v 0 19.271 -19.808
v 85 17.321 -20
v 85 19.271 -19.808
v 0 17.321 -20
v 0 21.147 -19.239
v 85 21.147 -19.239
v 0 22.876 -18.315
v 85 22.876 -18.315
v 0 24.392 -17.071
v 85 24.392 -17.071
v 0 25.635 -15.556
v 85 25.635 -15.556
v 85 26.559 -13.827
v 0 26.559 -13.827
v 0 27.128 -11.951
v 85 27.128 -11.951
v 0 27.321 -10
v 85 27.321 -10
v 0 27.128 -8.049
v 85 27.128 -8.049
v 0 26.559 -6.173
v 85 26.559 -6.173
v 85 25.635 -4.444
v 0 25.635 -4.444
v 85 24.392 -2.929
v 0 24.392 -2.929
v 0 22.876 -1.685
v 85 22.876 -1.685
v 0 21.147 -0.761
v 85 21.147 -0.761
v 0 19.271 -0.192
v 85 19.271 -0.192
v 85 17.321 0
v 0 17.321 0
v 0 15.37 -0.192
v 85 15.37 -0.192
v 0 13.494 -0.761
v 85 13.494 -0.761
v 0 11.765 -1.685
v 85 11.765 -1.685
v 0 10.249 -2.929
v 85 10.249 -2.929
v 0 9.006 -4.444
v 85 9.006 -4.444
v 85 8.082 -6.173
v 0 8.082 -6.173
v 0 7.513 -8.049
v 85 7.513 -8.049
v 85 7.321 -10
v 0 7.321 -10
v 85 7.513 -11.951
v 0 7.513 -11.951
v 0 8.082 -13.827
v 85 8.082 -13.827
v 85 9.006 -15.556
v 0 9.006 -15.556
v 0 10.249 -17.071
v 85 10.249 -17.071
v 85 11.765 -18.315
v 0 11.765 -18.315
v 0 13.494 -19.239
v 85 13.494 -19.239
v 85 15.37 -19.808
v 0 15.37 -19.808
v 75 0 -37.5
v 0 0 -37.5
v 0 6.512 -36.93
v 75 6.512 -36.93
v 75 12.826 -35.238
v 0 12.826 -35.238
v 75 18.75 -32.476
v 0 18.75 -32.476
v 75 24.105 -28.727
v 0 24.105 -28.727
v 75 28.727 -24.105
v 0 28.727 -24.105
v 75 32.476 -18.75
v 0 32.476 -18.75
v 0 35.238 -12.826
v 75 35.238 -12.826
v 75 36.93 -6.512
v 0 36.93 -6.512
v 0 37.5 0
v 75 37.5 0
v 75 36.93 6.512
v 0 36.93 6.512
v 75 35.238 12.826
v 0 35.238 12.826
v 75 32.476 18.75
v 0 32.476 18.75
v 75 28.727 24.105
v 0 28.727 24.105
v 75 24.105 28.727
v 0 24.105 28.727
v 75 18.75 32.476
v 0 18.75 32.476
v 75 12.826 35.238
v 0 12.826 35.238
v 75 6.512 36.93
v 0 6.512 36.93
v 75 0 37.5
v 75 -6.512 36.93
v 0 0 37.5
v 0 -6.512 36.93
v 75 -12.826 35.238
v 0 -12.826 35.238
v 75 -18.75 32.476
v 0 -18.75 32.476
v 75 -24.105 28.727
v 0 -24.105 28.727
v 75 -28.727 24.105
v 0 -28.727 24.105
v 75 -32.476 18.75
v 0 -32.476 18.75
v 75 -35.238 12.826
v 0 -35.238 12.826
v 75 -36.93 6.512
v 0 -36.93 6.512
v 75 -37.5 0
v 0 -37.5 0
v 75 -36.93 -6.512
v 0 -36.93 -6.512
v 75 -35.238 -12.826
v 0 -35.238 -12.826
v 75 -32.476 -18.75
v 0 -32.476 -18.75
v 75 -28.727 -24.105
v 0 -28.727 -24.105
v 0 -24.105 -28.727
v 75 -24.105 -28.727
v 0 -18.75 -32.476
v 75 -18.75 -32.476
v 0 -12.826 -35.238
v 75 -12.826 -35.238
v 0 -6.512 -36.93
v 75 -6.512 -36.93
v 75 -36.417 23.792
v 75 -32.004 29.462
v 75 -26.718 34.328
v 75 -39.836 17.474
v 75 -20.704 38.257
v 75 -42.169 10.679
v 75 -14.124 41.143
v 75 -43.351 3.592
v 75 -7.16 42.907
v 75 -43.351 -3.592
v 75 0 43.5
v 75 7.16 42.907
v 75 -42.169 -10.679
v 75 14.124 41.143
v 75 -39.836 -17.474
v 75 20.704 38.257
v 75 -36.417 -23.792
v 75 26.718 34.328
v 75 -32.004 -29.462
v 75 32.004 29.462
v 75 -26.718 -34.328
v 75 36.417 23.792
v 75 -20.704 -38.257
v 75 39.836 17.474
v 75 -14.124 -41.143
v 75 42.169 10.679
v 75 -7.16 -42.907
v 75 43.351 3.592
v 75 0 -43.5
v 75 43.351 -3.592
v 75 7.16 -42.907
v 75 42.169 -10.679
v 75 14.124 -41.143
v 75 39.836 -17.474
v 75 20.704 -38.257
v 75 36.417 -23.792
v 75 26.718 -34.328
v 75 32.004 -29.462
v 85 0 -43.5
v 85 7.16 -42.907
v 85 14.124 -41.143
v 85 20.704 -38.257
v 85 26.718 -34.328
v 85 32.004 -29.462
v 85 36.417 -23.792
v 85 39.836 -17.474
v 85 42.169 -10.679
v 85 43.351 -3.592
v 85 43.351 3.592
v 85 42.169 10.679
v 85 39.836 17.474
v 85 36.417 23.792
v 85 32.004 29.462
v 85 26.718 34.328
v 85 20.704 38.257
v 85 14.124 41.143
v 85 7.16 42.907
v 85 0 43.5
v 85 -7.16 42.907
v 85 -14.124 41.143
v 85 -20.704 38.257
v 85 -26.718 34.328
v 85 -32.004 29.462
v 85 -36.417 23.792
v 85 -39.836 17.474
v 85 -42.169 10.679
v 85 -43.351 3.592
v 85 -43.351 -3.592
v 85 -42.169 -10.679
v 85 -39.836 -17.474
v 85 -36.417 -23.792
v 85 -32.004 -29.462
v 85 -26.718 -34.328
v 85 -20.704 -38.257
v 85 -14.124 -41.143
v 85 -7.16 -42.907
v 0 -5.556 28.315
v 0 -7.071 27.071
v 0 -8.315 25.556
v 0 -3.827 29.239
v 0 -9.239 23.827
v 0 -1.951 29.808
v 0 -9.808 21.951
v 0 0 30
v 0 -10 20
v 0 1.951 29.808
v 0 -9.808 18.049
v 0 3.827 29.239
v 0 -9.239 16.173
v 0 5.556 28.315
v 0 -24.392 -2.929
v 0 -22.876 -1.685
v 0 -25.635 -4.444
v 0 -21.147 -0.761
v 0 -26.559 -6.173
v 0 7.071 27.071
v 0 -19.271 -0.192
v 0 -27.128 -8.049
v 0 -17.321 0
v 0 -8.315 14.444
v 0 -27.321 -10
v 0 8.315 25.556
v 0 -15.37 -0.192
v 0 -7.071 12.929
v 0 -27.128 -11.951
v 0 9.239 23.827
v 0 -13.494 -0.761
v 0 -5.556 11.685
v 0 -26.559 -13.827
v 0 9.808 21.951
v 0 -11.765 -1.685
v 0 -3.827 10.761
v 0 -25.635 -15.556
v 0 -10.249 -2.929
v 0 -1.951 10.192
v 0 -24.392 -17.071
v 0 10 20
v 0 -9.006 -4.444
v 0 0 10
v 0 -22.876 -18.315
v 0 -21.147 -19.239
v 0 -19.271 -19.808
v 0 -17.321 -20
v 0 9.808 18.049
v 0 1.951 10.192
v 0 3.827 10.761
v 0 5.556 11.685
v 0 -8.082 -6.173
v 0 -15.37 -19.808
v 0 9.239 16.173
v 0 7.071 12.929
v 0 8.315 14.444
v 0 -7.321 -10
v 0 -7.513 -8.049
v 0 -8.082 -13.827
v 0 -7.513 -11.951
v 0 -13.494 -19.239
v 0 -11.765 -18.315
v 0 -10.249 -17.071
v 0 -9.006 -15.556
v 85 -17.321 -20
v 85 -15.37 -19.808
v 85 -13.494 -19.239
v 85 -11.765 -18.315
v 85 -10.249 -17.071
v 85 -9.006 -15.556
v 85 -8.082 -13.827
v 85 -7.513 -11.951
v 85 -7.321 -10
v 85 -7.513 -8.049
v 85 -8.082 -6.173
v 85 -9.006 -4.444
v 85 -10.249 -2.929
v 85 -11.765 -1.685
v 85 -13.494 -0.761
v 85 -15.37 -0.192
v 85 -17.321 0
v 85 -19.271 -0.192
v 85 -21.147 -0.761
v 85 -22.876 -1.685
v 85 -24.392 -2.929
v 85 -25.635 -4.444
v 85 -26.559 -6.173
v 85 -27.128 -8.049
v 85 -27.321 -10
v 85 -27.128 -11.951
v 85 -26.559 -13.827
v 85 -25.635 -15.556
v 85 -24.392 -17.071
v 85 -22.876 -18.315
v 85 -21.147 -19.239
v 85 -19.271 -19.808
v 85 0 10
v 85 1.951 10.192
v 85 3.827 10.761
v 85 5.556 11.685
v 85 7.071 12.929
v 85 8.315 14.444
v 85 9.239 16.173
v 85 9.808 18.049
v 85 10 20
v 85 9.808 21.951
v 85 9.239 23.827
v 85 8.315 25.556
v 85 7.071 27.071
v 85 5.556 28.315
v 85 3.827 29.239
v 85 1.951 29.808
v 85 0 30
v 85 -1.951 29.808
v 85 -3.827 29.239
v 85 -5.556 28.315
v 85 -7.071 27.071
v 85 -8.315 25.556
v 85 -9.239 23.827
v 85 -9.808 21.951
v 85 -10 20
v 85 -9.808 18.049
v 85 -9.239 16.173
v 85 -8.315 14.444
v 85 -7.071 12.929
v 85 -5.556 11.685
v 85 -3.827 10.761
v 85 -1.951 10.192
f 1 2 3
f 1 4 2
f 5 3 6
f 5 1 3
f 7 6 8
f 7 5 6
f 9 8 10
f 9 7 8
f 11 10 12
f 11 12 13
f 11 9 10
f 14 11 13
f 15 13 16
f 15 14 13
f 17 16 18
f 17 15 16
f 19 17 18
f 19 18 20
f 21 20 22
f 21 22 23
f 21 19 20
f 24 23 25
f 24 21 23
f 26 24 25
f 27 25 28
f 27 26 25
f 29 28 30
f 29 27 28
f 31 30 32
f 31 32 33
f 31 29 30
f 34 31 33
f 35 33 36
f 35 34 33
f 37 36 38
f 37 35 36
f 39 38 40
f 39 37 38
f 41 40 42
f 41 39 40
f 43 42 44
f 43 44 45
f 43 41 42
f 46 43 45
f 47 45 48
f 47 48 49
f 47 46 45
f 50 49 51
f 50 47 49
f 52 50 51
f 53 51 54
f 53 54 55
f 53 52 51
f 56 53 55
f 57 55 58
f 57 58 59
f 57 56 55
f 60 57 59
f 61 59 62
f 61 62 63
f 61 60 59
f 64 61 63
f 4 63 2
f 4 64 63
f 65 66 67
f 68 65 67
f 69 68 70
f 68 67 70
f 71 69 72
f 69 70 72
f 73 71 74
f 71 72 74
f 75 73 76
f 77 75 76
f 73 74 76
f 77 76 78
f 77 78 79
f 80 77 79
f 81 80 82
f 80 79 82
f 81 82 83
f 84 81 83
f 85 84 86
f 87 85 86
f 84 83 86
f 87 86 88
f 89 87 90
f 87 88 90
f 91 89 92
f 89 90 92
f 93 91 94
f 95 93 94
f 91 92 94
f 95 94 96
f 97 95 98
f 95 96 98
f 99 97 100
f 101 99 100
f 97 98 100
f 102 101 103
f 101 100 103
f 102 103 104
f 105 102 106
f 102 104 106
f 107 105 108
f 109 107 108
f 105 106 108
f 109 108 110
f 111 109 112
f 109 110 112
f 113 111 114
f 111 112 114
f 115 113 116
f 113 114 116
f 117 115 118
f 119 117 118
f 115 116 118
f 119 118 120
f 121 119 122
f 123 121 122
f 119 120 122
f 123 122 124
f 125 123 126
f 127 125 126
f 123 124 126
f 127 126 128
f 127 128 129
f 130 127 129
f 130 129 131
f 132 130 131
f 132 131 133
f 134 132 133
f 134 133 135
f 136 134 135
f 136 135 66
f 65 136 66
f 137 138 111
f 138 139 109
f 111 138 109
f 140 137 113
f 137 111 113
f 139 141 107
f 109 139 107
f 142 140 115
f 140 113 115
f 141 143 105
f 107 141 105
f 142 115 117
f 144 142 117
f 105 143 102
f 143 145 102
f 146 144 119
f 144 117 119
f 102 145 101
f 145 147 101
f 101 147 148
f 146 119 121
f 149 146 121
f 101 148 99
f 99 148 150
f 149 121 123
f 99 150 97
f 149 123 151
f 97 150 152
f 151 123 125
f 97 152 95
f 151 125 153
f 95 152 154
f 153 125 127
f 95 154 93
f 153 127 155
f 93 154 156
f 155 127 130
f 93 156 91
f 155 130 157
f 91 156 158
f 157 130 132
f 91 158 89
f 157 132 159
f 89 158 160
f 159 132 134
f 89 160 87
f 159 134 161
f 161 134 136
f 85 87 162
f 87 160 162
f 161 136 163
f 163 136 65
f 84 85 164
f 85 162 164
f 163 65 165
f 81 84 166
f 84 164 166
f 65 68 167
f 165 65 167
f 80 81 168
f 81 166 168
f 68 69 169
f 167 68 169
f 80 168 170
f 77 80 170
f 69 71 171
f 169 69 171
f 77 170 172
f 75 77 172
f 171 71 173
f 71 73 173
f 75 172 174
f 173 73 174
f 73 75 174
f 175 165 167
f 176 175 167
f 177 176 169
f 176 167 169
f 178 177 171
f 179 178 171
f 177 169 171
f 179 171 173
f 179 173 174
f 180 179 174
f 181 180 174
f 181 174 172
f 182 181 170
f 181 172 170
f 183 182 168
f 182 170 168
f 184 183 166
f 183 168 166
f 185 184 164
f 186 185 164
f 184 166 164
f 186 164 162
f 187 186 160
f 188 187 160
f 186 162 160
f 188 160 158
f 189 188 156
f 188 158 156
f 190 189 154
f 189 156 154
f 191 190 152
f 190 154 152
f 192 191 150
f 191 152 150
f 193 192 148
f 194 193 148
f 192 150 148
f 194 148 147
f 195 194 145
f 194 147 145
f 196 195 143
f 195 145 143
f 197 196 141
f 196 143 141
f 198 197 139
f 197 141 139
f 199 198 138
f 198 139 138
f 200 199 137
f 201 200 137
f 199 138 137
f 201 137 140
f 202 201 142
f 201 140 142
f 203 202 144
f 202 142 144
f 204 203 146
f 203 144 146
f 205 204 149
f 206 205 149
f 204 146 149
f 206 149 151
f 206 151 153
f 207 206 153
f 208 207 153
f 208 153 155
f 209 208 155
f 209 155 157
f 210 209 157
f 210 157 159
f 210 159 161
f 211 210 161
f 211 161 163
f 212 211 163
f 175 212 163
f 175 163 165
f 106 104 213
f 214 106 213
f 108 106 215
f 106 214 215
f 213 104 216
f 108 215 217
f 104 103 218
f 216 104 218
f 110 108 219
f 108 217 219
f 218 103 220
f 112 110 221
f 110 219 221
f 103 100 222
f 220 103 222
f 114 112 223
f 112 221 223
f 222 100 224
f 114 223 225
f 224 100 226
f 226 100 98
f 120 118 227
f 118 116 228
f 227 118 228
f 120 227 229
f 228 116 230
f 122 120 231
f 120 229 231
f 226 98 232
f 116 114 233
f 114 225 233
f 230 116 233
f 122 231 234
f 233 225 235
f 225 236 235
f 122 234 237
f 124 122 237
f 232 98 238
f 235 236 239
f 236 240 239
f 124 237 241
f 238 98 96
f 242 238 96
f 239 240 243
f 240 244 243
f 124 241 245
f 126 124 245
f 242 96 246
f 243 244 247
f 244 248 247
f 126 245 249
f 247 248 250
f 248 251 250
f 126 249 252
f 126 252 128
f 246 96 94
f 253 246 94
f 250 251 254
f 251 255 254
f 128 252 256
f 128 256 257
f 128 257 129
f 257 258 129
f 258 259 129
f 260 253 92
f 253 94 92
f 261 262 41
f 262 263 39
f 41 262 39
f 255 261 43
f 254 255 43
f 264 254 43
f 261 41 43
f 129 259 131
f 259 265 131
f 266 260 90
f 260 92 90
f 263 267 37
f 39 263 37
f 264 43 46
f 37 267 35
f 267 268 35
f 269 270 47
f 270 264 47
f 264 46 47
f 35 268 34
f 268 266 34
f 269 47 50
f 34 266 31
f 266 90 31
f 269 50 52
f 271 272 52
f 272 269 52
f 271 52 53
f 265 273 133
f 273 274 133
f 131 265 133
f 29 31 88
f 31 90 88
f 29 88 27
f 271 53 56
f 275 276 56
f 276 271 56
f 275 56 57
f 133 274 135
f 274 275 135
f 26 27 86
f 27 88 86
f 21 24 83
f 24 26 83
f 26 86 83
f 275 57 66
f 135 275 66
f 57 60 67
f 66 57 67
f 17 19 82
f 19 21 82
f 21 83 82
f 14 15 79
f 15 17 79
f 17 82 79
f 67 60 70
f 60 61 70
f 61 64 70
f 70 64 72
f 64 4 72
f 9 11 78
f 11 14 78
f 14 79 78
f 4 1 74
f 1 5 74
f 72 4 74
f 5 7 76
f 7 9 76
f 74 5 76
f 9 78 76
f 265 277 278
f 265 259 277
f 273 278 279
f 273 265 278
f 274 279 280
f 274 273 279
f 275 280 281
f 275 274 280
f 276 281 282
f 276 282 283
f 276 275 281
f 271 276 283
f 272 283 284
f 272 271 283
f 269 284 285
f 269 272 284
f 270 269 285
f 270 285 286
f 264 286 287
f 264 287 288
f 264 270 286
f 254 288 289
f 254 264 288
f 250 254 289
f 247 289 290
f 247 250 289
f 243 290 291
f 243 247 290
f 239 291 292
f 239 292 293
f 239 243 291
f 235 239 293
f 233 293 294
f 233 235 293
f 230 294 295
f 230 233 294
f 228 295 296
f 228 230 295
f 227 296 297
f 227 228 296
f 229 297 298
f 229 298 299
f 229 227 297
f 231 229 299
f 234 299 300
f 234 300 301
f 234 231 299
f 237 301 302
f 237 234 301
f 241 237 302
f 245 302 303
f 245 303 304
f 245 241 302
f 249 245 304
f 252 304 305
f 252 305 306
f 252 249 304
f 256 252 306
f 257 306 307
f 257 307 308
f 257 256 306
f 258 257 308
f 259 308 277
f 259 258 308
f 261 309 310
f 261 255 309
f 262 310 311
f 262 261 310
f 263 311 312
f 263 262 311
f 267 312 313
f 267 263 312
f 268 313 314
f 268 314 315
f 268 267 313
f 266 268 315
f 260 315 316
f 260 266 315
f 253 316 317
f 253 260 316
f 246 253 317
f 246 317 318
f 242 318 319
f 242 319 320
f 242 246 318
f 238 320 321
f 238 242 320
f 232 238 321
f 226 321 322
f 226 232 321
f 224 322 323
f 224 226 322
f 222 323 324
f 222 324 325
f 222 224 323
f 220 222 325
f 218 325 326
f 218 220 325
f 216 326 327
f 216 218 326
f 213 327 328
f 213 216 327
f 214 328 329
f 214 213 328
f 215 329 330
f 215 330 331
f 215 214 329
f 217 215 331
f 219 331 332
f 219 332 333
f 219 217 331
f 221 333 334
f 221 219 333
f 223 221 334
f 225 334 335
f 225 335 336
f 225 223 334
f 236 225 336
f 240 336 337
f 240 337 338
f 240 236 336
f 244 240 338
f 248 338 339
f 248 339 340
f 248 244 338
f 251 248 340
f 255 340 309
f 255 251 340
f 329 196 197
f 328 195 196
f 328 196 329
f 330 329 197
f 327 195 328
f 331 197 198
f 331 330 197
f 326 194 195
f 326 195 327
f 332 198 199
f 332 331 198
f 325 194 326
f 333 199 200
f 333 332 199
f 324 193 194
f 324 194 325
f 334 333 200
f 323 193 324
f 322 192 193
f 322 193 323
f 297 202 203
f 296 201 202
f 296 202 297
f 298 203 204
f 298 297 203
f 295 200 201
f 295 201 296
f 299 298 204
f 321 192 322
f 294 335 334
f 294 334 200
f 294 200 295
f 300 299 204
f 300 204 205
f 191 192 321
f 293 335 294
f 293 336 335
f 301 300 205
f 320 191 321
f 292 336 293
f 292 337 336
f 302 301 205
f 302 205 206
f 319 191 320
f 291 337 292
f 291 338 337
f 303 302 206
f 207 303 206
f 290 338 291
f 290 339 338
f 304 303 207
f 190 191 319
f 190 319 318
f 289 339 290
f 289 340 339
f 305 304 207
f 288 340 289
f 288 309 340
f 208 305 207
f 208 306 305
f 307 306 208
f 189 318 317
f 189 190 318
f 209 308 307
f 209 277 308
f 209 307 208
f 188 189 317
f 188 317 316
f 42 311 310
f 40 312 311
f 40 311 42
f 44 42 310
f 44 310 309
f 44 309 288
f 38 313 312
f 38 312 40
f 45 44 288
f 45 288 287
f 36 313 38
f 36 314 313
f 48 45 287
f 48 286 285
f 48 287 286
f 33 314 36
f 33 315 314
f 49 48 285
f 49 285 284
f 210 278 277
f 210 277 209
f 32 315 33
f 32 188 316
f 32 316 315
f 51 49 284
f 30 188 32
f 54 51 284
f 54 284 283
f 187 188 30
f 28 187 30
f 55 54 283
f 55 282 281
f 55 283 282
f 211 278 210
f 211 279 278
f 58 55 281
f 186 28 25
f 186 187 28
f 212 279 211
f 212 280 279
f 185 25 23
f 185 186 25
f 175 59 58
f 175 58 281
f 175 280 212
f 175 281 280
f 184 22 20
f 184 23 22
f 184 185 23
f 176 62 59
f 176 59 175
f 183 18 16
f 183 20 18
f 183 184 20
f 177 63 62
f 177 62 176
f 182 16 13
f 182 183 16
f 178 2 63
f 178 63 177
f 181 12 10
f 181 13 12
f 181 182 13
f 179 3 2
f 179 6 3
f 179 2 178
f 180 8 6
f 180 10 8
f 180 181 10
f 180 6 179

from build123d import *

# Parameters (mm, degrees)
BOSS_EXTRUDE1_OUTLINE_R   = 37.5
BOSS_EXTRUDE1_OUTLINE_R_2 = 10
BOSS_EXTRUDE1_DEPTH       = 75
SKETCH3_R                 = 43.5
SKETCH3_R_2               = 10
BOSS_EXTRUDE2_DEPTH       = 10


# Read off the part's stored shape, not the designer's step: Boss-Extrude1
with BuildPart() as part:
    # Boss-Extrude1 outline → Boss-Extrude1 (new body)
    with BuildSketch(Plane(origin=(0, 0, 0), x_dir=(0, 0, -1), z_dir=(1, 0, 0))):
        Circle(BOSS_EXTRUDE1_OUTLINE_R)
        with Locations((10, -17.320508076)):
            Circle(BOSS_EXTRUDE1_OUTLINE_R_2, mode=Mode.SUBTRACT)
        with Locations((-20, 0)):
            Circle(BOSS_EXTRUDE1_OUTLINE_R_2, mode=Mode.SUBTRACT)
        with Locations((10, 17.320508076)):
            Circle(BOSS_EXTRUDE1_OUTLINE_R_2, mode=Mode.SUBTRACT)
    extrude(amount=BOSS_EXTRUDE1_DEPTH)

    # Sketch3 → Boss-Extrude2 (add)
    with BuildSketch(Plane(origin=(75, 0, 0), x_dir=(0, 0, -1), z_dir=(1, 0, 0))):
        Circle(SKETCH3_R)
        with Locations((-20, 0)):
            Circle(SKETCH3_R_2, mode=Mode.SUBTRACT)
        with Locations((10, 17.320508076)):
            Circle(SKETCH3_R_2, mode=Mode.SUBTRACT)
        with Locations((10, -17.320508076)):
            Circle(SKETCH3_R_2, mode=Mode.SUBTRACT)
    extrude(amount=BOSS_EXTRUDE2_DEPTH)


solid = part.part
